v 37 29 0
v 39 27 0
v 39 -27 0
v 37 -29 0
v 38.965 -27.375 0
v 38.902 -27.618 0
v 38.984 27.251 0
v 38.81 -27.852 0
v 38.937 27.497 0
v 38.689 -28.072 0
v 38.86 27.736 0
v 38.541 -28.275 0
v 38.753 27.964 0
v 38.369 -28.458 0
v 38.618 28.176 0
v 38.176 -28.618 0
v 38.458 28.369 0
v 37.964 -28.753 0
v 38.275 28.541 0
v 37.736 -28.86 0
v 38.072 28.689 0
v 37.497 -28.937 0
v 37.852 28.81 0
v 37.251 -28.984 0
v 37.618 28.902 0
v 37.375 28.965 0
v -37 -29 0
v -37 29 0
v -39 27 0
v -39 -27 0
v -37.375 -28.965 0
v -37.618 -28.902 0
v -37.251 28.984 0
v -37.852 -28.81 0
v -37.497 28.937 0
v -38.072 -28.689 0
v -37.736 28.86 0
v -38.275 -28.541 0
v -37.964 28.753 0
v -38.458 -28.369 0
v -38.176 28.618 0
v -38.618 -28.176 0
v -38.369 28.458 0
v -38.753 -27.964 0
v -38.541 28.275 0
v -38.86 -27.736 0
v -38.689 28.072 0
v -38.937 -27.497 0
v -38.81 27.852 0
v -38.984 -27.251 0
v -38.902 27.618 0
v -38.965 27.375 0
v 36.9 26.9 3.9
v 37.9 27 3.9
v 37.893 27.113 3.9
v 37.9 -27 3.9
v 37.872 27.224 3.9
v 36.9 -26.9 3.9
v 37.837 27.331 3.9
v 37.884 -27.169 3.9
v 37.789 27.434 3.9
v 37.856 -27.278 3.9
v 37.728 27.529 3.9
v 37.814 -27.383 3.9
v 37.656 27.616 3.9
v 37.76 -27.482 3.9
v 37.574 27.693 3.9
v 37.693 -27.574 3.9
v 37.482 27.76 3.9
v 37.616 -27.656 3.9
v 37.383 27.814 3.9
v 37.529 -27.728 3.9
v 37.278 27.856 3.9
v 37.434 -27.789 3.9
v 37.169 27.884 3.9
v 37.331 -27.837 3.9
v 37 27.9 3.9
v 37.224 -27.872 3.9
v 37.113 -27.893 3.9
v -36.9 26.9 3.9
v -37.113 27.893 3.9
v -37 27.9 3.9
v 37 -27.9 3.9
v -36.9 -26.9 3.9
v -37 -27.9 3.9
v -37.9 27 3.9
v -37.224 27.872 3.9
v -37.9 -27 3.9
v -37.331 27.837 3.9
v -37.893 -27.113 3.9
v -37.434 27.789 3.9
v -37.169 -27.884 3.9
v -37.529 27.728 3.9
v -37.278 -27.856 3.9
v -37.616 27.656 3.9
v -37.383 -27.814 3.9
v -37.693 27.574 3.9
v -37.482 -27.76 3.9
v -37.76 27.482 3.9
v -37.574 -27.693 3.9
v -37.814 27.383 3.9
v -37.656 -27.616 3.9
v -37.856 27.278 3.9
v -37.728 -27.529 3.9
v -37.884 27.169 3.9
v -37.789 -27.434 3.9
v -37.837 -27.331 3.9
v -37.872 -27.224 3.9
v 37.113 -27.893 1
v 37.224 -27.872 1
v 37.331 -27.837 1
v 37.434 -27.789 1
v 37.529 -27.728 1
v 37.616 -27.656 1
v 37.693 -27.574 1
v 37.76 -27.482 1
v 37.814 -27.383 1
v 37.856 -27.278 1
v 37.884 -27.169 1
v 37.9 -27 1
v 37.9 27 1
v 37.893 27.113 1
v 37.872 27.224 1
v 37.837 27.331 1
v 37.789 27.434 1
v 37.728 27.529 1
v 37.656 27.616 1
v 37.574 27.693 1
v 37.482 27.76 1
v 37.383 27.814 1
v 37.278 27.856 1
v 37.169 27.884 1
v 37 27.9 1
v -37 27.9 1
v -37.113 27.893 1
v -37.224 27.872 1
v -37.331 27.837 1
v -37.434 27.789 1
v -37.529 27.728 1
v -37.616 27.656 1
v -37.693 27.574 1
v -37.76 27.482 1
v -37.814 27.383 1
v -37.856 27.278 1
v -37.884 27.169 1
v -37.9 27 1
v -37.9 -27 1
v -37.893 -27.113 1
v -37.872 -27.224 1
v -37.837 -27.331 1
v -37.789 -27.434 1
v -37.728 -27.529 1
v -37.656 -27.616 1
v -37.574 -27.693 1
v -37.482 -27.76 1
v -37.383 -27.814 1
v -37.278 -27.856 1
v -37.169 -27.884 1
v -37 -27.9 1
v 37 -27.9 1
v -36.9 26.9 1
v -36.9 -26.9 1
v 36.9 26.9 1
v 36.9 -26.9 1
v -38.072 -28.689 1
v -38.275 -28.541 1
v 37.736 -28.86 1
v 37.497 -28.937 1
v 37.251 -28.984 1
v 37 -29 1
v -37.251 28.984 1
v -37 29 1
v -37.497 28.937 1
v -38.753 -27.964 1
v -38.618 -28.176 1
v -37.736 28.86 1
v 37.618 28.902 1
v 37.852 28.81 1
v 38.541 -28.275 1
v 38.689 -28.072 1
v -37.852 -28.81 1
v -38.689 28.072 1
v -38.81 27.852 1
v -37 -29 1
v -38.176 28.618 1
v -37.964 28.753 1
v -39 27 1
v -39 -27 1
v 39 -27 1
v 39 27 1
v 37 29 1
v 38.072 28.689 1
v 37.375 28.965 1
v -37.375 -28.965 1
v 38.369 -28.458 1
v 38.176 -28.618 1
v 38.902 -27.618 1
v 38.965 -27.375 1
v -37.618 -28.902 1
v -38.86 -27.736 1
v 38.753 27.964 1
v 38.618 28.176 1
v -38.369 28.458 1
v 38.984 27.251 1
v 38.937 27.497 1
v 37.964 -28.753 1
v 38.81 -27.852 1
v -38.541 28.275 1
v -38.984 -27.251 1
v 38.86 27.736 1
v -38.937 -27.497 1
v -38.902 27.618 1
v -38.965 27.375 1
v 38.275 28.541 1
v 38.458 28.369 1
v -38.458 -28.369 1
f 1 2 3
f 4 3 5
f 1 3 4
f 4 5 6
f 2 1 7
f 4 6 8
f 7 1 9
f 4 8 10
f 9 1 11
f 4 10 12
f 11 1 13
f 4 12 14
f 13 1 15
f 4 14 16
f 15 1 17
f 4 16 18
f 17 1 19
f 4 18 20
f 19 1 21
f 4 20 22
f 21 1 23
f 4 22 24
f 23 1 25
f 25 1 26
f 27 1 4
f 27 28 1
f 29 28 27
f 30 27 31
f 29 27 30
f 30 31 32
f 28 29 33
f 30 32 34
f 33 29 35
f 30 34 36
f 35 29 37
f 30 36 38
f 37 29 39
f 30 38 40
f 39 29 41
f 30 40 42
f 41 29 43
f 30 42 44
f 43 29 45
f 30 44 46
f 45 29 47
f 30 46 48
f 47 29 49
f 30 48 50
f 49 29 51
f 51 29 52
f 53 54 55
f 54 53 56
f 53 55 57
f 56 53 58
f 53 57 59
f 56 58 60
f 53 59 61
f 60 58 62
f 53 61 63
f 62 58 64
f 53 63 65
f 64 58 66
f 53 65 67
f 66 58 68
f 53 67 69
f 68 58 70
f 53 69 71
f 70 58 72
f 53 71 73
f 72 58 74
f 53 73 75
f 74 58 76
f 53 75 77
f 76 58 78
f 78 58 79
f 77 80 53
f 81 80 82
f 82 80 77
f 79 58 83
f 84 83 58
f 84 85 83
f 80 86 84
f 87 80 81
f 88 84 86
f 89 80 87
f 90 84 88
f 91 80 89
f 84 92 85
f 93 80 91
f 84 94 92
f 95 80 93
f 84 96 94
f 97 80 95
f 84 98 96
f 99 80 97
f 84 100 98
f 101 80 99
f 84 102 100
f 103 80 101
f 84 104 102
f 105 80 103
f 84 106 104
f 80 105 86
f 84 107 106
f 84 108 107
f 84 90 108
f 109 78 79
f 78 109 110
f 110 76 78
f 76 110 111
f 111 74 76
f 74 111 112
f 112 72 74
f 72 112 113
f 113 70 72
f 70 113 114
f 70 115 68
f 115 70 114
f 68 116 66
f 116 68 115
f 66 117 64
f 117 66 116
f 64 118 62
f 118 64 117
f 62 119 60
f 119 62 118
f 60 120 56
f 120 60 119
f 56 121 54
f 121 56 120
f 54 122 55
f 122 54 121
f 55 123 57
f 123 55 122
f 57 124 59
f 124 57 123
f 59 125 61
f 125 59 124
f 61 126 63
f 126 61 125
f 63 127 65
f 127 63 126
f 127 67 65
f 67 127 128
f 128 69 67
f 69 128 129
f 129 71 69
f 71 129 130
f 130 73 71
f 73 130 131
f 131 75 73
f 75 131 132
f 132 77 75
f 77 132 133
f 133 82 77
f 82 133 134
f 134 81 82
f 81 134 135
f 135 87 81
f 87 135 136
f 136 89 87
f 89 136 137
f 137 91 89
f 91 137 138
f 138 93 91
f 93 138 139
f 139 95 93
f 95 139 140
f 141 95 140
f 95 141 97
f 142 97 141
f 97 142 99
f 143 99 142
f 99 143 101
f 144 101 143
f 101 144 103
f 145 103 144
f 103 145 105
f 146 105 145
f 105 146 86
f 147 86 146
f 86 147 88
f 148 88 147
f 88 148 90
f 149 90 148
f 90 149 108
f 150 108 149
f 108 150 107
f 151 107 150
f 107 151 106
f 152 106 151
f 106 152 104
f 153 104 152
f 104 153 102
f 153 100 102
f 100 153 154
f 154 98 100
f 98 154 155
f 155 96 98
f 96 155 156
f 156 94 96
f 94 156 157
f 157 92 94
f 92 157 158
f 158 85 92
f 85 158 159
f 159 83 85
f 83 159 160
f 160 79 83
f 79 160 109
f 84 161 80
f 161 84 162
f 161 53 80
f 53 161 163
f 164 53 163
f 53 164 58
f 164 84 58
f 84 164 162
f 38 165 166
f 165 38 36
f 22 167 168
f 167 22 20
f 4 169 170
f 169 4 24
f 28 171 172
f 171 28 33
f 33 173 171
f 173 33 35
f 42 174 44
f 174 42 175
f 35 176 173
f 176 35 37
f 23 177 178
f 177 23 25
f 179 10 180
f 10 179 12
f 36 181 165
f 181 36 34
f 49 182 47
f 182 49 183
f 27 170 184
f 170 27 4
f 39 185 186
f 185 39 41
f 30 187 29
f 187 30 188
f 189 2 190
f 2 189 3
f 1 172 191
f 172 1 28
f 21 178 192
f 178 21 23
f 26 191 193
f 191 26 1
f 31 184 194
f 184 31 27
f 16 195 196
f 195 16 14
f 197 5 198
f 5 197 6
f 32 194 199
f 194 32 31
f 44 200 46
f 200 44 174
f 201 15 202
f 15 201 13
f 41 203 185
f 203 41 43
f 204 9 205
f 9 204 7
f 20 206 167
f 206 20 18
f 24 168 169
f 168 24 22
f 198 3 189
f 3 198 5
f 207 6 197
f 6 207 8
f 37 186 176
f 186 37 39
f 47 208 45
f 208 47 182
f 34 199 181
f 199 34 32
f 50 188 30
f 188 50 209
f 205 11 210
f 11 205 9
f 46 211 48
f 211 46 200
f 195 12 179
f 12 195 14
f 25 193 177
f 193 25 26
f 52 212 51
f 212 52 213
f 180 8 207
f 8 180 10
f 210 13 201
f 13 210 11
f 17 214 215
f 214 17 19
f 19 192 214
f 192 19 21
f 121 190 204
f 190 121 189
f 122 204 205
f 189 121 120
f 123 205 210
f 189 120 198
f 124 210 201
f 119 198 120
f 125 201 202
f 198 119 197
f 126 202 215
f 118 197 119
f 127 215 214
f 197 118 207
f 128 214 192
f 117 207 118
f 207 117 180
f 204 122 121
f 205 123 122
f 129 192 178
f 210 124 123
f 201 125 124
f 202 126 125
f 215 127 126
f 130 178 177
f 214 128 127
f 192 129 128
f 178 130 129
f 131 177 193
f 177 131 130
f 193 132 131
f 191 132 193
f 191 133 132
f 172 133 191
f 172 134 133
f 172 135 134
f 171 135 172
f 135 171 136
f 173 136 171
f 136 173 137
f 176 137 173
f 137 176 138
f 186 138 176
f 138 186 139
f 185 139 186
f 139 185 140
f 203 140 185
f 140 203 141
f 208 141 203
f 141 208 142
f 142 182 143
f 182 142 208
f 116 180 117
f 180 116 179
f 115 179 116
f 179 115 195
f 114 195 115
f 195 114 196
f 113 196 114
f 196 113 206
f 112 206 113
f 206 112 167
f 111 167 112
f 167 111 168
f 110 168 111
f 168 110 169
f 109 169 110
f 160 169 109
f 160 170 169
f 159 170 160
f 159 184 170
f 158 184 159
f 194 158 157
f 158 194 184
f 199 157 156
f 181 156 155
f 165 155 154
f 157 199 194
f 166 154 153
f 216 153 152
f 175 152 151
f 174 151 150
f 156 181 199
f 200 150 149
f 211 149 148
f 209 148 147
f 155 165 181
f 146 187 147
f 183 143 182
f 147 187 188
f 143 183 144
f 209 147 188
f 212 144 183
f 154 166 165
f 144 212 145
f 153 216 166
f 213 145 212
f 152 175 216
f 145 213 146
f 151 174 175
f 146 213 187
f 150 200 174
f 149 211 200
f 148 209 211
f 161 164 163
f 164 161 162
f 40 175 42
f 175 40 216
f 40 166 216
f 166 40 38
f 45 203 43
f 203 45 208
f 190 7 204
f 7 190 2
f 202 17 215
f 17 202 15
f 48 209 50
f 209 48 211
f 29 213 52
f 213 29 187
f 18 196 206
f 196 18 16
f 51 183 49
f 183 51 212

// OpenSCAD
ovDims=[78,58,28];
floorThck=1;
wallThck=1;
radius=2;
spcng=0.1;

$fn=50;


*walls();
walls(ovDims+[-(wallThck+spcng)*2,-(wallThck+spcng)*2,-23],radius-wallThck-spcng);
topBottom();


module topBottom(){
  linear_extrude(floorThck) offset(radius) square([ovDims.x-radius*2,ovDims.y-radius*2],true);
}


module walls(dims=ovDims,rad=radius){
  linear_extrude(dims.z-floorThck-spcng) difference(){
    offset(rad) square([dims.x-rad*2,dims.y-rad*2],true);
    offset(rad-wallThck) square([dims.x-rad*2,dims.y-rad*2],true);
  }
}
